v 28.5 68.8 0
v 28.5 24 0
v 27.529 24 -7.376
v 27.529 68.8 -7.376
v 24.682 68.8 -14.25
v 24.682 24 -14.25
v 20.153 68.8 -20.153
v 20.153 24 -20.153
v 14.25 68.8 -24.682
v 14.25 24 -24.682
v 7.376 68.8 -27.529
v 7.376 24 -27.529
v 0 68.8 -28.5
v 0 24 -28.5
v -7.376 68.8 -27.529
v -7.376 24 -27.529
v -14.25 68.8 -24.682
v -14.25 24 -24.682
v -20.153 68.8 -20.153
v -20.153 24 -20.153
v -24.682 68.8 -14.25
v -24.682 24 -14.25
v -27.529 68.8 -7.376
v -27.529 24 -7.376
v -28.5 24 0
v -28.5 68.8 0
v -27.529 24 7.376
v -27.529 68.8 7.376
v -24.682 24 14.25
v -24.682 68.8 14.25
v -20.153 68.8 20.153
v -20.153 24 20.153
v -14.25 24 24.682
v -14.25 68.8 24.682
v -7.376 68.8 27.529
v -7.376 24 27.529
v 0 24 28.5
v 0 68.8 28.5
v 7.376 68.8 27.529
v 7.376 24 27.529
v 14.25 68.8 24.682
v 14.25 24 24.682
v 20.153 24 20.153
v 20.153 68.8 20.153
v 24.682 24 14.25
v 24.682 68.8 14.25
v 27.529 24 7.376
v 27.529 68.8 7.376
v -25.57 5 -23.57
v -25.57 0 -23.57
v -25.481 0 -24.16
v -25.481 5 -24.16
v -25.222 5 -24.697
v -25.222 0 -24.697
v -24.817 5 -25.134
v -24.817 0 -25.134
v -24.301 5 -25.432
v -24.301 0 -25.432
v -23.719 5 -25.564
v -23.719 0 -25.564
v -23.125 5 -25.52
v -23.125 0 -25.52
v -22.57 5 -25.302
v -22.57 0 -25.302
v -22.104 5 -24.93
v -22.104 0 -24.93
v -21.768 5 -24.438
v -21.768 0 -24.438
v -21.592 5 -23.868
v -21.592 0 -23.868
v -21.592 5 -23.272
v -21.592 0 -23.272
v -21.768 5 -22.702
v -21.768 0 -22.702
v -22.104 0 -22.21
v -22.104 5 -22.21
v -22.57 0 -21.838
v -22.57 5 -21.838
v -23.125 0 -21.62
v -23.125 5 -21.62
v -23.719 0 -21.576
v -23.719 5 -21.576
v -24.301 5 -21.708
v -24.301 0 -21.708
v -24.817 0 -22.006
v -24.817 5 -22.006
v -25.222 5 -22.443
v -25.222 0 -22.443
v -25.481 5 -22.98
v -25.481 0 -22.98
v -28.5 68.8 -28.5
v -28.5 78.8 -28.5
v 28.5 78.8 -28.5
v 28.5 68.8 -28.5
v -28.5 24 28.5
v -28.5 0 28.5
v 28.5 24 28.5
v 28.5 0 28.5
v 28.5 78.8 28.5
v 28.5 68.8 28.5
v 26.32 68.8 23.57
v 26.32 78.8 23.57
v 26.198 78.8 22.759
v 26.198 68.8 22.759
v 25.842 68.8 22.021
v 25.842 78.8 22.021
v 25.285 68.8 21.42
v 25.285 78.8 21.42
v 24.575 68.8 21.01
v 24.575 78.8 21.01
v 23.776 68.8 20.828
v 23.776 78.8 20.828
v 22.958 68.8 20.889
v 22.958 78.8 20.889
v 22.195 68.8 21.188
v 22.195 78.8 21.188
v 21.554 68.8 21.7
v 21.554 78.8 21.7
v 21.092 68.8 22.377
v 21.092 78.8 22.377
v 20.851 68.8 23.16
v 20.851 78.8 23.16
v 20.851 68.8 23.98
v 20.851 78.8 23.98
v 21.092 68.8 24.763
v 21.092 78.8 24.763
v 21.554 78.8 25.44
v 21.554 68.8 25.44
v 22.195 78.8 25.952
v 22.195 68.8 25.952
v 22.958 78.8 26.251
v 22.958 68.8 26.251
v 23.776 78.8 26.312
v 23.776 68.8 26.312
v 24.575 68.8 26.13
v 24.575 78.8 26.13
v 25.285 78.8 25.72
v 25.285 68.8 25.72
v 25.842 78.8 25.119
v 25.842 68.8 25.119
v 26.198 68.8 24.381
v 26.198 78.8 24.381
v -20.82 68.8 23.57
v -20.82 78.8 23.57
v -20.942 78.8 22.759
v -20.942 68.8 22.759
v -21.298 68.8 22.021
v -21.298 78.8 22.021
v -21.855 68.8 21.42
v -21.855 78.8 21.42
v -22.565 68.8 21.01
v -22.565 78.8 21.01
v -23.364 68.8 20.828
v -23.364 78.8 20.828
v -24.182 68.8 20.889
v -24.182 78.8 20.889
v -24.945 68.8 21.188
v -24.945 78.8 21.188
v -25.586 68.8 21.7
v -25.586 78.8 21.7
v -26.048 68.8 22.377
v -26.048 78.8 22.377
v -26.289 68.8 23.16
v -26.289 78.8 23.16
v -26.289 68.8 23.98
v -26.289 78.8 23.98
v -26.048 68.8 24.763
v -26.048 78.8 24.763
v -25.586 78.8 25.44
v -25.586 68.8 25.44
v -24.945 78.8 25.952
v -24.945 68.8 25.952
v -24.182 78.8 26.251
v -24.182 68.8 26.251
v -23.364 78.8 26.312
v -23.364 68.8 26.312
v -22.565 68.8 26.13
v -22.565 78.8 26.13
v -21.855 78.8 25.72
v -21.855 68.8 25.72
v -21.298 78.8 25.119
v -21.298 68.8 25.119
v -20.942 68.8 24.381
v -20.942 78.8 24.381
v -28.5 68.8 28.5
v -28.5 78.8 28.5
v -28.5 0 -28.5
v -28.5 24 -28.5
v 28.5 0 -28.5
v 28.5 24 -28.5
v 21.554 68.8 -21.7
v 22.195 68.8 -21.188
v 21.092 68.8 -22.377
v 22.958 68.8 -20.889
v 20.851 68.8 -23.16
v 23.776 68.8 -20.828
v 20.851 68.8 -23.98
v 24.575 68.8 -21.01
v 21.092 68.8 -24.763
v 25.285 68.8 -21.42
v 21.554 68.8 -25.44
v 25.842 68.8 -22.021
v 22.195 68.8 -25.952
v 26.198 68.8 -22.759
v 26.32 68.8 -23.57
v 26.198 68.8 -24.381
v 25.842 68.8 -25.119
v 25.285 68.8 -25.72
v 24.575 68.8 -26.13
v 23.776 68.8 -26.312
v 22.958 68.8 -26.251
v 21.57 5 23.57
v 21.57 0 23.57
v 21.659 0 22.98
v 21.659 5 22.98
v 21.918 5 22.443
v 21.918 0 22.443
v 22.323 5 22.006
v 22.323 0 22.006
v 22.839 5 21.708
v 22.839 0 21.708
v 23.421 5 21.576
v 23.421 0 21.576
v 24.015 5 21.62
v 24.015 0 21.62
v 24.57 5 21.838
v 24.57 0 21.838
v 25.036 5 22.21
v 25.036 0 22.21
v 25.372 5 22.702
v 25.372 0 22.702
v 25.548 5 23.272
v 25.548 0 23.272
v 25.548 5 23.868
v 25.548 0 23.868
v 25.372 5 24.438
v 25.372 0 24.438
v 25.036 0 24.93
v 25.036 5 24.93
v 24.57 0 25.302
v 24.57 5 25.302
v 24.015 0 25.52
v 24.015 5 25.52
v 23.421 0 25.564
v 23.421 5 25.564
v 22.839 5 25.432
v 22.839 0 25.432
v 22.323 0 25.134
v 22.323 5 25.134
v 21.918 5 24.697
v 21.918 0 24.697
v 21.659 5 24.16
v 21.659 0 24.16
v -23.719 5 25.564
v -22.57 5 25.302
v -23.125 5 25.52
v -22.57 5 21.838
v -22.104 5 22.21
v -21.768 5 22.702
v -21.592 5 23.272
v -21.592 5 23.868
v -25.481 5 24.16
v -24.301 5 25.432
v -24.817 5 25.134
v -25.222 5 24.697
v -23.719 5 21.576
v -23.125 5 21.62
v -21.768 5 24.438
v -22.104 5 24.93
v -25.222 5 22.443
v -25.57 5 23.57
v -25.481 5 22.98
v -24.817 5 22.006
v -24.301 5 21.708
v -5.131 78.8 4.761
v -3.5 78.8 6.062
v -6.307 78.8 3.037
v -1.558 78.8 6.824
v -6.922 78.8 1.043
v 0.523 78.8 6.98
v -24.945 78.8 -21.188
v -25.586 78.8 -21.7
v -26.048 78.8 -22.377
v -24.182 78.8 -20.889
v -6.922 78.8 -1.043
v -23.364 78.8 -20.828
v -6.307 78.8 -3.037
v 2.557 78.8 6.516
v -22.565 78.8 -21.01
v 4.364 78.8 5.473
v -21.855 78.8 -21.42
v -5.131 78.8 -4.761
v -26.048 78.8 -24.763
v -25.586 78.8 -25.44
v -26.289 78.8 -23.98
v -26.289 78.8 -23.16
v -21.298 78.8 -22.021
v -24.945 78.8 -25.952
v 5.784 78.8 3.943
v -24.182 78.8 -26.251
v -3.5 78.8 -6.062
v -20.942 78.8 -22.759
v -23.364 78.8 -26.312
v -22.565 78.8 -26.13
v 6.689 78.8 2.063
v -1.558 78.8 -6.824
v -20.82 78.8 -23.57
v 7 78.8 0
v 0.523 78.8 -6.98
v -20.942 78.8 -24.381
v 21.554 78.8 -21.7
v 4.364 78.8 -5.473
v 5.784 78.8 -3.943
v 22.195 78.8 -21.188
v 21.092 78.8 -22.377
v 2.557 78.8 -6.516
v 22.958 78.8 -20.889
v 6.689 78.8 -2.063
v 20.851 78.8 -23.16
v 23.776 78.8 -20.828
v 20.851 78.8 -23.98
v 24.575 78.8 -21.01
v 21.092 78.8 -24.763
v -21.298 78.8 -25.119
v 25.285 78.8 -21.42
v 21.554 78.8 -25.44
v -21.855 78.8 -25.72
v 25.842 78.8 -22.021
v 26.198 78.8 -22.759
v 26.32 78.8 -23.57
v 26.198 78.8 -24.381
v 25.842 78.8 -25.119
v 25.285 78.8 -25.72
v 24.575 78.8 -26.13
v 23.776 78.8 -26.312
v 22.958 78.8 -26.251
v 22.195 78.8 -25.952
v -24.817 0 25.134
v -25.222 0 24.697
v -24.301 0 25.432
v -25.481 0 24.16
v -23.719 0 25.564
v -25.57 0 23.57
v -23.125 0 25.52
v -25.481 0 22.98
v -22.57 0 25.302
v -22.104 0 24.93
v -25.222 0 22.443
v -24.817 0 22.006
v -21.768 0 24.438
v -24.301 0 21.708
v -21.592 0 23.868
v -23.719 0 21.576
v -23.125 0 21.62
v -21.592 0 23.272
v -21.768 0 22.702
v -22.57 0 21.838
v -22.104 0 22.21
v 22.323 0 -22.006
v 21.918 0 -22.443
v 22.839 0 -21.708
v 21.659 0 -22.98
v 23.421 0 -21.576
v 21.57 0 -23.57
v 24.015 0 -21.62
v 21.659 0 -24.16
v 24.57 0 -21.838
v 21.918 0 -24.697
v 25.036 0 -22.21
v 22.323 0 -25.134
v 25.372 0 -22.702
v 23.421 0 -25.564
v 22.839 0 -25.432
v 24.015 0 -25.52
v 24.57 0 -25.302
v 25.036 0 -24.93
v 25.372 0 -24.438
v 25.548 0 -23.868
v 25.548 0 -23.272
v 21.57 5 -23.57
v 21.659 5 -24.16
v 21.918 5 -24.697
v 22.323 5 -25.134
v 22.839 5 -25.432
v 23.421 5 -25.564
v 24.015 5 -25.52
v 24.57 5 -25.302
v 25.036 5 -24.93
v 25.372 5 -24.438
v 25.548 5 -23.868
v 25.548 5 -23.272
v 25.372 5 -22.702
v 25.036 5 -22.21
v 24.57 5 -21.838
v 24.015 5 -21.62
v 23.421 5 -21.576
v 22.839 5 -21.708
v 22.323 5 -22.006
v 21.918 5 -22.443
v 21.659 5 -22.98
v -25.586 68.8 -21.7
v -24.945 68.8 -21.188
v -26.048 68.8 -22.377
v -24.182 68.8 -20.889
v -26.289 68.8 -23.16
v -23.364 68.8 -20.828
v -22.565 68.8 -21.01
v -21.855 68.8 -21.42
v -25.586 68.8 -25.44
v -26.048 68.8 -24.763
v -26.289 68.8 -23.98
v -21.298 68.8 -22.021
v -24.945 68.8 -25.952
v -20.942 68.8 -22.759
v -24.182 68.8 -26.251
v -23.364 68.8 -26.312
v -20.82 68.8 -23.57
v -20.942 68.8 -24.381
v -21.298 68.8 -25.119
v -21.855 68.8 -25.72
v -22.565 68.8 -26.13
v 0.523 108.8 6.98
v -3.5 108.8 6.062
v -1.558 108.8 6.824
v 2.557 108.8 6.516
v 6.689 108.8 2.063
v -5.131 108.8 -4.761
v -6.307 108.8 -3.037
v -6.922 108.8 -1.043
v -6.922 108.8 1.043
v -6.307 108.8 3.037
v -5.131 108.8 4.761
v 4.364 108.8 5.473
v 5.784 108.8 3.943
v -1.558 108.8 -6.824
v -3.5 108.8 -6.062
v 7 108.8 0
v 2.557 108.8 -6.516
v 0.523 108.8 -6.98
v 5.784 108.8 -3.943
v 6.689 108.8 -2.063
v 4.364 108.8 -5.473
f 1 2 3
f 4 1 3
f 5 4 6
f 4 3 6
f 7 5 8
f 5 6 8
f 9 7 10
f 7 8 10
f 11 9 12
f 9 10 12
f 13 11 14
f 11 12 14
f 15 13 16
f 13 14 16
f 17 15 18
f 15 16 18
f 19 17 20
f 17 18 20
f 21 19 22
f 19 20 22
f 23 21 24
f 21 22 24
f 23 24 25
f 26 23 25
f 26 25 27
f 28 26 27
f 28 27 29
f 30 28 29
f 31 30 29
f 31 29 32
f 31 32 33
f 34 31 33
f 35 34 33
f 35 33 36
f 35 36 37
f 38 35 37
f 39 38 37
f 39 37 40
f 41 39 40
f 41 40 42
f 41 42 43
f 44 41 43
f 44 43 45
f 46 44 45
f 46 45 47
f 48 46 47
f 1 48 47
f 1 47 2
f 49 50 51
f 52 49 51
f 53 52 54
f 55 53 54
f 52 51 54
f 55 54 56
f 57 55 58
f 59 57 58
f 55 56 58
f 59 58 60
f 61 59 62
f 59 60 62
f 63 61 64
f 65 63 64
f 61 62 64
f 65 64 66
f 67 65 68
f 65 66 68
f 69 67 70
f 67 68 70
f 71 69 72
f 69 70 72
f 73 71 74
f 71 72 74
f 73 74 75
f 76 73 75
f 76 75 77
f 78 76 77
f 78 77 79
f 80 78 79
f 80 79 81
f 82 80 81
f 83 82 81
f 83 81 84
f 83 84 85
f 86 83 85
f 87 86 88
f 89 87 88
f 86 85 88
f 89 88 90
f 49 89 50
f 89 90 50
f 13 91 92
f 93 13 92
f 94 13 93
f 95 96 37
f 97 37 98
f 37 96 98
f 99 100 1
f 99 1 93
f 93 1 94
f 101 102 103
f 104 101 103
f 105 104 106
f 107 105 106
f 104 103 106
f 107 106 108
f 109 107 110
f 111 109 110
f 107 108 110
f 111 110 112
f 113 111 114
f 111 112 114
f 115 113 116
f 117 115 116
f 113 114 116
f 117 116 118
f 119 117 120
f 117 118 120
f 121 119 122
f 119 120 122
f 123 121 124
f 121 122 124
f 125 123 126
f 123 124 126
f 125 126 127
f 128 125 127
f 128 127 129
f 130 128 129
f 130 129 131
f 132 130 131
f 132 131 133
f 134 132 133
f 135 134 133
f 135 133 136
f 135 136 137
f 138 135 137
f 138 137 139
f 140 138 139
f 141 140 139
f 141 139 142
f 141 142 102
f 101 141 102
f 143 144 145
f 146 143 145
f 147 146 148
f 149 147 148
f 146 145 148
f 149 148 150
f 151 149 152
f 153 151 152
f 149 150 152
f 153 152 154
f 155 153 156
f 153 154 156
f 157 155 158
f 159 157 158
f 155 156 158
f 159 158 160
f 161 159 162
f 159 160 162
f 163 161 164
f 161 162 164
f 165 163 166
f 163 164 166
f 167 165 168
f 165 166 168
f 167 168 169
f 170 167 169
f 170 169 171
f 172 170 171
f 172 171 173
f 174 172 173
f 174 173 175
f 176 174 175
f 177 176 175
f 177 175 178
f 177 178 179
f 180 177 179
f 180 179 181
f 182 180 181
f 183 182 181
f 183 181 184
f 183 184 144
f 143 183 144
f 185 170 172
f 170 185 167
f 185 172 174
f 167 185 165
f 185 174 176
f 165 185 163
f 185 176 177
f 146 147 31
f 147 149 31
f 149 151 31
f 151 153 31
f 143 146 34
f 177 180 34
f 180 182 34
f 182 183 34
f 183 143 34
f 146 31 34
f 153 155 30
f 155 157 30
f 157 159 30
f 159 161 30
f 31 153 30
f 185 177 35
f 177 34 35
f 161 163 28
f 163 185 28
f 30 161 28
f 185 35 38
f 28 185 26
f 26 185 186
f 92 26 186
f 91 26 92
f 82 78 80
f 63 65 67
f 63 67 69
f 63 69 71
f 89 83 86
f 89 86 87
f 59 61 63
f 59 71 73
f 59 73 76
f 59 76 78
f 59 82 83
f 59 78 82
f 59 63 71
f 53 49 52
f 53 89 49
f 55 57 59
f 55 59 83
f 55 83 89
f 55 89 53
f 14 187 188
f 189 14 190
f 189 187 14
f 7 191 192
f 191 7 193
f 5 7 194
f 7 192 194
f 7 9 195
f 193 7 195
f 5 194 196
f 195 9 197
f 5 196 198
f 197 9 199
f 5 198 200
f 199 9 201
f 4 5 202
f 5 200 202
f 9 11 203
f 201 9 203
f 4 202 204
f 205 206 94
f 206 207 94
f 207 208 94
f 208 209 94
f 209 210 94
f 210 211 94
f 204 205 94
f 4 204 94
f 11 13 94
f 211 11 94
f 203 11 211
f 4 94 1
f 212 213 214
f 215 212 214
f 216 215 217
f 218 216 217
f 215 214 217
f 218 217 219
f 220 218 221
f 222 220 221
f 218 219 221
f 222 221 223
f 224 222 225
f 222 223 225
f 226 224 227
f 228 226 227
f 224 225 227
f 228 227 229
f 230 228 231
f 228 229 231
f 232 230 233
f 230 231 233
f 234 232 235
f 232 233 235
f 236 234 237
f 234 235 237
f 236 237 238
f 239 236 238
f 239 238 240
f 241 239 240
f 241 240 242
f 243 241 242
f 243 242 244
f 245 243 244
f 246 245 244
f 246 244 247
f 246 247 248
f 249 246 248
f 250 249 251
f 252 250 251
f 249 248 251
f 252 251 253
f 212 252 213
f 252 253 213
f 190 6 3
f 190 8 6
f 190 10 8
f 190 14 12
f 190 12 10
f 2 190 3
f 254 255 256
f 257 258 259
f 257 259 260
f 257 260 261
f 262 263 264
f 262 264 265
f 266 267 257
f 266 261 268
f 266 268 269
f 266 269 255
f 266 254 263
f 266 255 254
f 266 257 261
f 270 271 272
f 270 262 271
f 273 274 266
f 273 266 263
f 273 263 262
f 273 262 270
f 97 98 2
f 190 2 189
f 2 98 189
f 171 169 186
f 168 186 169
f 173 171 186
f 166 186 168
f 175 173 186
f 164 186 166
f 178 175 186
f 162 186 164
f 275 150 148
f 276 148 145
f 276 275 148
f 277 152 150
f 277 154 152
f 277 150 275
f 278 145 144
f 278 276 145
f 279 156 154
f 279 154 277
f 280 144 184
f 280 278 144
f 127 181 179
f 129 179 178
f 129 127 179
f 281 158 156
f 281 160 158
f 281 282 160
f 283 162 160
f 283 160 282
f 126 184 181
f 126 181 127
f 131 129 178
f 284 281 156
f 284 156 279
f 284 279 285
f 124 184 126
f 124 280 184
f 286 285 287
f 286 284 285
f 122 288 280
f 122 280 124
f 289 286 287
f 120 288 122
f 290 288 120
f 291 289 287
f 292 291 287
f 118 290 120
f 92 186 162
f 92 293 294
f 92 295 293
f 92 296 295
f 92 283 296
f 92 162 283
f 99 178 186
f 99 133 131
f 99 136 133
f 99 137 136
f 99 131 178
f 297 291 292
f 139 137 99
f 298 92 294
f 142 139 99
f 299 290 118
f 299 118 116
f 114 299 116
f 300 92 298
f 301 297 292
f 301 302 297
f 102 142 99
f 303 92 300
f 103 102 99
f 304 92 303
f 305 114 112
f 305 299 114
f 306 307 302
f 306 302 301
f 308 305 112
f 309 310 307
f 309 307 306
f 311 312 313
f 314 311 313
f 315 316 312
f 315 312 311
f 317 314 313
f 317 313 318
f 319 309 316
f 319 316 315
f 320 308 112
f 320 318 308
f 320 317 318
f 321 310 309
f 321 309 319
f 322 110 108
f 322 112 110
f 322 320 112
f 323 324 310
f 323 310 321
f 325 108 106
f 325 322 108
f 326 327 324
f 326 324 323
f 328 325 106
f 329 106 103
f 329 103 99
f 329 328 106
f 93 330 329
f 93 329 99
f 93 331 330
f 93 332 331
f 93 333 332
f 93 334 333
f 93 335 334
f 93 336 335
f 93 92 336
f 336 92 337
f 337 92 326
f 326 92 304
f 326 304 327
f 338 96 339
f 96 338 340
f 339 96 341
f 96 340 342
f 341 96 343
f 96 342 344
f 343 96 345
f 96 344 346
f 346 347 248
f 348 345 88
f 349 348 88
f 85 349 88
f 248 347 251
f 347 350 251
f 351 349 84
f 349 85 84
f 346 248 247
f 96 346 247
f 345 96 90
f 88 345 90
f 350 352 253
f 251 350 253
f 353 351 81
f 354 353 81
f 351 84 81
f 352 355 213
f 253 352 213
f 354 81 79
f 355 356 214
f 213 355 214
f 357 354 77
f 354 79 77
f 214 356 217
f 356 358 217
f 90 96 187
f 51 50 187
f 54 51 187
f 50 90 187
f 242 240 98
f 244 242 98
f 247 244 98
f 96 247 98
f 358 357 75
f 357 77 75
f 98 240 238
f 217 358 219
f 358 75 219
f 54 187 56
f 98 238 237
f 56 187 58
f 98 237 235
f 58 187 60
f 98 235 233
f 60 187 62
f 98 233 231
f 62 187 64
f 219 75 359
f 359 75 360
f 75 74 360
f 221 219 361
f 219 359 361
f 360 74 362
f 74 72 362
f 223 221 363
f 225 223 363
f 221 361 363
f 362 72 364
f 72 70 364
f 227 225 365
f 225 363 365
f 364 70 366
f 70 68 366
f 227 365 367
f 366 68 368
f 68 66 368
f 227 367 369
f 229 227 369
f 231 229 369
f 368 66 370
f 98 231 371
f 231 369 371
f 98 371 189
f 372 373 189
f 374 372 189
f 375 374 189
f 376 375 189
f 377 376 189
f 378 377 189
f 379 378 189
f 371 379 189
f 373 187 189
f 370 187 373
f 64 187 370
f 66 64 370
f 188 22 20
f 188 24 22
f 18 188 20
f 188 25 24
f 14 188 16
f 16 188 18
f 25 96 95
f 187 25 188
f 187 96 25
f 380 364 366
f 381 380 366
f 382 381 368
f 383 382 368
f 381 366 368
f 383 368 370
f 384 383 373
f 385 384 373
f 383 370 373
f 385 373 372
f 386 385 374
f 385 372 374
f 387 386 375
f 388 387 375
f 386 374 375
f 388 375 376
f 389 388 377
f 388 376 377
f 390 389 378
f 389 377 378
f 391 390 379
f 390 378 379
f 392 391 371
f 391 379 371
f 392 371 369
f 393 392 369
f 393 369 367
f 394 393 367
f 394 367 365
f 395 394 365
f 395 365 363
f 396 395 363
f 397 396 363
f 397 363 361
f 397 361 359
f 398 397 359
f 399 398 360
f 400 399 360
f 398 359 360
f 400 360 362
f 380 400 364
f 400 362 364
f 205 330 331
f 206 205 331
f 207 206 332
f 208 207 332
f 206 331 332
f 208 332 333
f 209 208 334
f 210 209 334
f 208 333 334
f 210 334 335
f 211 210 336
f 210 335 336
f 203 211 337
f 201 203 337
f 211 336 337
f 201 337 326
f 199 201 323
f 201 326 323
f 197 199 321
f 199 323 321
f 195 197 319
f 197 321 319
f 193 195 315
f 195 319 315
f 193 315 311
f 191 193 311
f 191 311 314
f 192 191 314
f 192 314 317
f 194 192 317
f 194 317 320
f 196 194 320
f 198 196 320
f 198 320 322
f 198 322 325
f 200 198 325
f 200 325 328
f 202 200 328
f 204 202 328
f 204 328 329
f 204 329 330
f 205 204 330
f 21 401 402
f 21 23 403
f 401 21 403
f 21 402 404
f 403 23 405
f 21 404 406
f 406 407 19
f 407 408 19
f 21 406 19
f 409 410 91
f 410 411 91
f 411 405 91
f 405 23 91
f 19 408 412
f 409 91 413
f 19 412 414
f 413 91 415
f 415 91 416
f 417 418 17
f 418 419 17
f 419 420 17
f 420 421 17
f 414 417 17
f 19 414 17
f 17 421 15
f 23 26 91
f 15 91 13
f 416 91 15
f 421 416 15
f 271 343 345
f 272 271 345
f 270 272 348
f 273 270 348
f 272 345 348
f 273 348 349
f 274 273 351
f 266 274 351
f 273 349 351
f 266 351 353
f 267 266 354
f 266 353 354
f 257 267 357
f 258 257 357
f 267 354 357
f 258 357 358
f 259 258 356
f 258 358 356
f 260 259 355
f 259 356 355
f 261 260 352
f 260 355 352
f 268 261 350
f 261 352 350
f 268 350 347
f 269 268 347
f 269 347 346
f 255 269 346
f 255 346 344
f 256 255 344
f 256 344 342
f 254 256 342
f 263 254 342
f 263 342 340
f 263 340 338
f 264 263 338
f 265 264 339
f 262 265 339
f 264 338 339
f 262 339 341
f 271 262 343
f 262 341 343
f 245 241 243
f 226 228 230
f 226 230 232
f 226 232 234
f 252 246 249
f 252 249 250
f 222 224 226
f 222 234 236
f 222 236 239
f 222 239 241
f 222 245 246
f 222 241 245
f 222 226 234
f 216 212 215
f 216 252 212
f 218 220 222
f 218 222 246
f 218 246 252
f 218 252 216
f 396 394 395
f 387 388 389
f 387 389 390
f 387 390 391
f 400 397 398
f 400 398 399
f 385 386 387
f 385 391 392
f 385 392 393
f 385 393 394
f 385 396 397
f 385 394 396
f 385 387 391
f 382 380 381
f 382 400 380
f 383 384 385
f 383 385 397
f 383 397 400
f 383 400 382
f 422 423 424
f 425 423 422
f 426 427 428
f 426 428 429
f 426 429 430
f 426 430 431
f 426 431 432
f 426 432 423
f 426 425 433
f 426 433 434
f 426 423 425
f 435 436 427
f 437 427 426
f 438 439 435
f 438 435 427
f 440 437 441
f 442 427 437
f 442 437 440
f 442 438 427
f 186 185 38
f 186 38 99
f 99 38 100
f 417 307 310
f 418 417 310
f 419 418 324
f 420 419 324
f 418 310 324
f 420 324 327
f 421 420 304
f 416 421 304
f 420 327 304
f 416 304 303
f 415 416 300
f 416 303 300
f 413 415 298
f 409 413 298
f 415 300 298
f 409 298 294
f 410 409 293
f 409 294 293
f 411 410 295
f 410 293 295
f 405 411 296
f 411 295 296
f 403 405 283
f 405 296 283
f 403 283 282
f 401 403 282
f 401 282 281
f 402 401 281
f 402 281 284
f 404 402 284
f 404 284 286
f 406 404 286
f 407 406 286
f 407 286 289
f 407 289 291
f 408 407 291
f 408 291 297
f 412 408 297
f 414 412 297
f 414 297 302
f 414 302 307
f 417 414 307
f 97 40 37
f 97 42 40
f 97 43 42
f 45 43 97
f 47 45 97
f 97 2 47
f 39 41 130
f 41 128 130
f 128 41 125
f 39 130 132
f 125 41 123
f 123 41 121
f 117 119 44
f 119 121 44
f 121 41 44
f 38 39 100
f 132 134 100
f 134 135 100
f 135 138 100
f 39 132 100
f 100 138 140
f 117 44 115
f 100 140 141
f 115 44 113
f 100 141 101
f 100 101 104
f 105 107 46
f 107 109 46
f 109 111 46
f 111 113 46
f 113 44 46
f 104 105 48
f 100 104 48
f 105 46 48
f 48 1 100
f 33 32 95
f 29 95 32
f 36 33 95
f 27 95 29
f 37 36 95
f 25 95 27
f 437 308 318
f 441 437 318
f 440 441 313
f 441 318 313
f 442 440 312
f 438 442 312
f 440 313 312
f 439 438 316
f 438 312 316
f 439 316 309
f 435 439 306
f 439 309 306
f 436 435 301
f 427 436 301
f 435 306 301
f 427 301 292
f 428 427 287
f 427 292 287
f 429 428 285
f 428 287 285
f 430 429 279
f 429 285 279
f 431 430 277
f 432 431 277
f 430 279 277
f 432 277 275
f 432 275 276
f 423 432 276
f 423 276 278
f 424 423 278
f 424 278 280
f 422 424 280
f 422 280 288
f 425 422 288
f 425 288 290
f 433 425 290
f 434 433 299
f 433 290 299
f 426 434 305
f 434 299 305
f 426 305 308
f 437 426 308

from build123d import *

# Parameters (mm, degrees)
SKETCH_1_W          = 57
SKETCH_1_H          = 57
EXTRUDE_3_DEPTH     = 24
SKETCH_3_R          = 28.5
EXTRUDE_4_DEPTH     = 44.8
SKETCH_4_W          = 57
SKETCH_4_H          = 57
EXTRUDE_5_DEPTH     = 10
SKETCH_6_R          = 7
EXTRUDE_6_DEPTH     = 30
SKETCH_7_R          = 2.75
CUT_EXTRUDE_1_DEPTH = 30
SKETCH_8_R          = 2
CUT_EXTRUDE_2_DEPTH = 5


with BuildPart() as part:
    # 草图1 → 凸台-拉伸3 (new body)
    with BuildSketch(Plane(origin=(0, 0, 0), x_dir=(1, 0, 0), z_dir=(0, 1, 0))):
        Rectangle(SKETCH_1_W, SKETCH_1_H)
    extrude(amount=EXTRUDE_3_DEPTH)

    # 草图3 → 凸台-拉伸4 (add)
    with BuildSketch(Plane(origin=(0, 24, 0), x_dir=(1, 0, 0), z_dir=(0, 1, 0))):
        Circle(SKETCH_3_R)
    extrude(amount=EXTRUDE_4_DEPTH)

    # 草图4 → 凸台-拉伸5 (add)
    with BuildSketch(Plane(origin=(0, 68.8, 0), x_dir=(1, 0, 0), z_dir=(0, 1, 0))):
        Rectangle(SKETCH_4_W, SKETCH_4_H)
    extrude(amount=EXTRUDE_5_DEPTH)

    # 草图6 → 凸台-拉伸6 (add)
    with BuildSketch(Plane(origin=(0, 78.8, 0), x_dir=(1, 0, 0), z_dir=(0, 1, 0))):
        Circle(SKETCH_6_R)
    extrude(amount=EXTRUDE_6_DEPTH)

    # 草图7 → 切除-拉伸1 (cut)
    with BuildSketch(Plane(origin=(0, 78.8, 0), x_dir=(1, 0, 0), z_dir=(0, 1, 0))):
        with Locations((23.57, -23.57)):
            Circle(SKETCH_7_R)
        with Locations((-23.57, -23.57)):
            Circle(SKETCH_7_R)
        with Locations((-23.57, 23.57)):
            Circle(SKETCH_7_R)
        with Locations((23.57, 23.57)):
            Circle(SKETCH_7_R)
    extrude(amount=-CUT_EXTRUDE_1_DEPTH, mode=Mode.SUBTRACT)

    # 草图8 → 切除-拉伸2 (cut)
    with BuildSketch(Plane(origin=(0, 0, 0), x_dir=(-1, 0, 0), z_dir=(0, -1, 0))):
        with Locations((23.57, 23.57)):
            Circle(SKETCH_8_R)
        with Locations((-23.57, 23.57)):
            Circle(SKETCH_8_R)
        with Locations((-23.57, -23.57)):
            Circle(SKETCH_8_R)
        with Locations((23.57, -23.57)):
            Circle(SKETCH_8_R)
    extrude(amount=-CUT_EXTRUDE_2_DEPTH, mode=Mode.SUBTRACT)


solid = part.part
